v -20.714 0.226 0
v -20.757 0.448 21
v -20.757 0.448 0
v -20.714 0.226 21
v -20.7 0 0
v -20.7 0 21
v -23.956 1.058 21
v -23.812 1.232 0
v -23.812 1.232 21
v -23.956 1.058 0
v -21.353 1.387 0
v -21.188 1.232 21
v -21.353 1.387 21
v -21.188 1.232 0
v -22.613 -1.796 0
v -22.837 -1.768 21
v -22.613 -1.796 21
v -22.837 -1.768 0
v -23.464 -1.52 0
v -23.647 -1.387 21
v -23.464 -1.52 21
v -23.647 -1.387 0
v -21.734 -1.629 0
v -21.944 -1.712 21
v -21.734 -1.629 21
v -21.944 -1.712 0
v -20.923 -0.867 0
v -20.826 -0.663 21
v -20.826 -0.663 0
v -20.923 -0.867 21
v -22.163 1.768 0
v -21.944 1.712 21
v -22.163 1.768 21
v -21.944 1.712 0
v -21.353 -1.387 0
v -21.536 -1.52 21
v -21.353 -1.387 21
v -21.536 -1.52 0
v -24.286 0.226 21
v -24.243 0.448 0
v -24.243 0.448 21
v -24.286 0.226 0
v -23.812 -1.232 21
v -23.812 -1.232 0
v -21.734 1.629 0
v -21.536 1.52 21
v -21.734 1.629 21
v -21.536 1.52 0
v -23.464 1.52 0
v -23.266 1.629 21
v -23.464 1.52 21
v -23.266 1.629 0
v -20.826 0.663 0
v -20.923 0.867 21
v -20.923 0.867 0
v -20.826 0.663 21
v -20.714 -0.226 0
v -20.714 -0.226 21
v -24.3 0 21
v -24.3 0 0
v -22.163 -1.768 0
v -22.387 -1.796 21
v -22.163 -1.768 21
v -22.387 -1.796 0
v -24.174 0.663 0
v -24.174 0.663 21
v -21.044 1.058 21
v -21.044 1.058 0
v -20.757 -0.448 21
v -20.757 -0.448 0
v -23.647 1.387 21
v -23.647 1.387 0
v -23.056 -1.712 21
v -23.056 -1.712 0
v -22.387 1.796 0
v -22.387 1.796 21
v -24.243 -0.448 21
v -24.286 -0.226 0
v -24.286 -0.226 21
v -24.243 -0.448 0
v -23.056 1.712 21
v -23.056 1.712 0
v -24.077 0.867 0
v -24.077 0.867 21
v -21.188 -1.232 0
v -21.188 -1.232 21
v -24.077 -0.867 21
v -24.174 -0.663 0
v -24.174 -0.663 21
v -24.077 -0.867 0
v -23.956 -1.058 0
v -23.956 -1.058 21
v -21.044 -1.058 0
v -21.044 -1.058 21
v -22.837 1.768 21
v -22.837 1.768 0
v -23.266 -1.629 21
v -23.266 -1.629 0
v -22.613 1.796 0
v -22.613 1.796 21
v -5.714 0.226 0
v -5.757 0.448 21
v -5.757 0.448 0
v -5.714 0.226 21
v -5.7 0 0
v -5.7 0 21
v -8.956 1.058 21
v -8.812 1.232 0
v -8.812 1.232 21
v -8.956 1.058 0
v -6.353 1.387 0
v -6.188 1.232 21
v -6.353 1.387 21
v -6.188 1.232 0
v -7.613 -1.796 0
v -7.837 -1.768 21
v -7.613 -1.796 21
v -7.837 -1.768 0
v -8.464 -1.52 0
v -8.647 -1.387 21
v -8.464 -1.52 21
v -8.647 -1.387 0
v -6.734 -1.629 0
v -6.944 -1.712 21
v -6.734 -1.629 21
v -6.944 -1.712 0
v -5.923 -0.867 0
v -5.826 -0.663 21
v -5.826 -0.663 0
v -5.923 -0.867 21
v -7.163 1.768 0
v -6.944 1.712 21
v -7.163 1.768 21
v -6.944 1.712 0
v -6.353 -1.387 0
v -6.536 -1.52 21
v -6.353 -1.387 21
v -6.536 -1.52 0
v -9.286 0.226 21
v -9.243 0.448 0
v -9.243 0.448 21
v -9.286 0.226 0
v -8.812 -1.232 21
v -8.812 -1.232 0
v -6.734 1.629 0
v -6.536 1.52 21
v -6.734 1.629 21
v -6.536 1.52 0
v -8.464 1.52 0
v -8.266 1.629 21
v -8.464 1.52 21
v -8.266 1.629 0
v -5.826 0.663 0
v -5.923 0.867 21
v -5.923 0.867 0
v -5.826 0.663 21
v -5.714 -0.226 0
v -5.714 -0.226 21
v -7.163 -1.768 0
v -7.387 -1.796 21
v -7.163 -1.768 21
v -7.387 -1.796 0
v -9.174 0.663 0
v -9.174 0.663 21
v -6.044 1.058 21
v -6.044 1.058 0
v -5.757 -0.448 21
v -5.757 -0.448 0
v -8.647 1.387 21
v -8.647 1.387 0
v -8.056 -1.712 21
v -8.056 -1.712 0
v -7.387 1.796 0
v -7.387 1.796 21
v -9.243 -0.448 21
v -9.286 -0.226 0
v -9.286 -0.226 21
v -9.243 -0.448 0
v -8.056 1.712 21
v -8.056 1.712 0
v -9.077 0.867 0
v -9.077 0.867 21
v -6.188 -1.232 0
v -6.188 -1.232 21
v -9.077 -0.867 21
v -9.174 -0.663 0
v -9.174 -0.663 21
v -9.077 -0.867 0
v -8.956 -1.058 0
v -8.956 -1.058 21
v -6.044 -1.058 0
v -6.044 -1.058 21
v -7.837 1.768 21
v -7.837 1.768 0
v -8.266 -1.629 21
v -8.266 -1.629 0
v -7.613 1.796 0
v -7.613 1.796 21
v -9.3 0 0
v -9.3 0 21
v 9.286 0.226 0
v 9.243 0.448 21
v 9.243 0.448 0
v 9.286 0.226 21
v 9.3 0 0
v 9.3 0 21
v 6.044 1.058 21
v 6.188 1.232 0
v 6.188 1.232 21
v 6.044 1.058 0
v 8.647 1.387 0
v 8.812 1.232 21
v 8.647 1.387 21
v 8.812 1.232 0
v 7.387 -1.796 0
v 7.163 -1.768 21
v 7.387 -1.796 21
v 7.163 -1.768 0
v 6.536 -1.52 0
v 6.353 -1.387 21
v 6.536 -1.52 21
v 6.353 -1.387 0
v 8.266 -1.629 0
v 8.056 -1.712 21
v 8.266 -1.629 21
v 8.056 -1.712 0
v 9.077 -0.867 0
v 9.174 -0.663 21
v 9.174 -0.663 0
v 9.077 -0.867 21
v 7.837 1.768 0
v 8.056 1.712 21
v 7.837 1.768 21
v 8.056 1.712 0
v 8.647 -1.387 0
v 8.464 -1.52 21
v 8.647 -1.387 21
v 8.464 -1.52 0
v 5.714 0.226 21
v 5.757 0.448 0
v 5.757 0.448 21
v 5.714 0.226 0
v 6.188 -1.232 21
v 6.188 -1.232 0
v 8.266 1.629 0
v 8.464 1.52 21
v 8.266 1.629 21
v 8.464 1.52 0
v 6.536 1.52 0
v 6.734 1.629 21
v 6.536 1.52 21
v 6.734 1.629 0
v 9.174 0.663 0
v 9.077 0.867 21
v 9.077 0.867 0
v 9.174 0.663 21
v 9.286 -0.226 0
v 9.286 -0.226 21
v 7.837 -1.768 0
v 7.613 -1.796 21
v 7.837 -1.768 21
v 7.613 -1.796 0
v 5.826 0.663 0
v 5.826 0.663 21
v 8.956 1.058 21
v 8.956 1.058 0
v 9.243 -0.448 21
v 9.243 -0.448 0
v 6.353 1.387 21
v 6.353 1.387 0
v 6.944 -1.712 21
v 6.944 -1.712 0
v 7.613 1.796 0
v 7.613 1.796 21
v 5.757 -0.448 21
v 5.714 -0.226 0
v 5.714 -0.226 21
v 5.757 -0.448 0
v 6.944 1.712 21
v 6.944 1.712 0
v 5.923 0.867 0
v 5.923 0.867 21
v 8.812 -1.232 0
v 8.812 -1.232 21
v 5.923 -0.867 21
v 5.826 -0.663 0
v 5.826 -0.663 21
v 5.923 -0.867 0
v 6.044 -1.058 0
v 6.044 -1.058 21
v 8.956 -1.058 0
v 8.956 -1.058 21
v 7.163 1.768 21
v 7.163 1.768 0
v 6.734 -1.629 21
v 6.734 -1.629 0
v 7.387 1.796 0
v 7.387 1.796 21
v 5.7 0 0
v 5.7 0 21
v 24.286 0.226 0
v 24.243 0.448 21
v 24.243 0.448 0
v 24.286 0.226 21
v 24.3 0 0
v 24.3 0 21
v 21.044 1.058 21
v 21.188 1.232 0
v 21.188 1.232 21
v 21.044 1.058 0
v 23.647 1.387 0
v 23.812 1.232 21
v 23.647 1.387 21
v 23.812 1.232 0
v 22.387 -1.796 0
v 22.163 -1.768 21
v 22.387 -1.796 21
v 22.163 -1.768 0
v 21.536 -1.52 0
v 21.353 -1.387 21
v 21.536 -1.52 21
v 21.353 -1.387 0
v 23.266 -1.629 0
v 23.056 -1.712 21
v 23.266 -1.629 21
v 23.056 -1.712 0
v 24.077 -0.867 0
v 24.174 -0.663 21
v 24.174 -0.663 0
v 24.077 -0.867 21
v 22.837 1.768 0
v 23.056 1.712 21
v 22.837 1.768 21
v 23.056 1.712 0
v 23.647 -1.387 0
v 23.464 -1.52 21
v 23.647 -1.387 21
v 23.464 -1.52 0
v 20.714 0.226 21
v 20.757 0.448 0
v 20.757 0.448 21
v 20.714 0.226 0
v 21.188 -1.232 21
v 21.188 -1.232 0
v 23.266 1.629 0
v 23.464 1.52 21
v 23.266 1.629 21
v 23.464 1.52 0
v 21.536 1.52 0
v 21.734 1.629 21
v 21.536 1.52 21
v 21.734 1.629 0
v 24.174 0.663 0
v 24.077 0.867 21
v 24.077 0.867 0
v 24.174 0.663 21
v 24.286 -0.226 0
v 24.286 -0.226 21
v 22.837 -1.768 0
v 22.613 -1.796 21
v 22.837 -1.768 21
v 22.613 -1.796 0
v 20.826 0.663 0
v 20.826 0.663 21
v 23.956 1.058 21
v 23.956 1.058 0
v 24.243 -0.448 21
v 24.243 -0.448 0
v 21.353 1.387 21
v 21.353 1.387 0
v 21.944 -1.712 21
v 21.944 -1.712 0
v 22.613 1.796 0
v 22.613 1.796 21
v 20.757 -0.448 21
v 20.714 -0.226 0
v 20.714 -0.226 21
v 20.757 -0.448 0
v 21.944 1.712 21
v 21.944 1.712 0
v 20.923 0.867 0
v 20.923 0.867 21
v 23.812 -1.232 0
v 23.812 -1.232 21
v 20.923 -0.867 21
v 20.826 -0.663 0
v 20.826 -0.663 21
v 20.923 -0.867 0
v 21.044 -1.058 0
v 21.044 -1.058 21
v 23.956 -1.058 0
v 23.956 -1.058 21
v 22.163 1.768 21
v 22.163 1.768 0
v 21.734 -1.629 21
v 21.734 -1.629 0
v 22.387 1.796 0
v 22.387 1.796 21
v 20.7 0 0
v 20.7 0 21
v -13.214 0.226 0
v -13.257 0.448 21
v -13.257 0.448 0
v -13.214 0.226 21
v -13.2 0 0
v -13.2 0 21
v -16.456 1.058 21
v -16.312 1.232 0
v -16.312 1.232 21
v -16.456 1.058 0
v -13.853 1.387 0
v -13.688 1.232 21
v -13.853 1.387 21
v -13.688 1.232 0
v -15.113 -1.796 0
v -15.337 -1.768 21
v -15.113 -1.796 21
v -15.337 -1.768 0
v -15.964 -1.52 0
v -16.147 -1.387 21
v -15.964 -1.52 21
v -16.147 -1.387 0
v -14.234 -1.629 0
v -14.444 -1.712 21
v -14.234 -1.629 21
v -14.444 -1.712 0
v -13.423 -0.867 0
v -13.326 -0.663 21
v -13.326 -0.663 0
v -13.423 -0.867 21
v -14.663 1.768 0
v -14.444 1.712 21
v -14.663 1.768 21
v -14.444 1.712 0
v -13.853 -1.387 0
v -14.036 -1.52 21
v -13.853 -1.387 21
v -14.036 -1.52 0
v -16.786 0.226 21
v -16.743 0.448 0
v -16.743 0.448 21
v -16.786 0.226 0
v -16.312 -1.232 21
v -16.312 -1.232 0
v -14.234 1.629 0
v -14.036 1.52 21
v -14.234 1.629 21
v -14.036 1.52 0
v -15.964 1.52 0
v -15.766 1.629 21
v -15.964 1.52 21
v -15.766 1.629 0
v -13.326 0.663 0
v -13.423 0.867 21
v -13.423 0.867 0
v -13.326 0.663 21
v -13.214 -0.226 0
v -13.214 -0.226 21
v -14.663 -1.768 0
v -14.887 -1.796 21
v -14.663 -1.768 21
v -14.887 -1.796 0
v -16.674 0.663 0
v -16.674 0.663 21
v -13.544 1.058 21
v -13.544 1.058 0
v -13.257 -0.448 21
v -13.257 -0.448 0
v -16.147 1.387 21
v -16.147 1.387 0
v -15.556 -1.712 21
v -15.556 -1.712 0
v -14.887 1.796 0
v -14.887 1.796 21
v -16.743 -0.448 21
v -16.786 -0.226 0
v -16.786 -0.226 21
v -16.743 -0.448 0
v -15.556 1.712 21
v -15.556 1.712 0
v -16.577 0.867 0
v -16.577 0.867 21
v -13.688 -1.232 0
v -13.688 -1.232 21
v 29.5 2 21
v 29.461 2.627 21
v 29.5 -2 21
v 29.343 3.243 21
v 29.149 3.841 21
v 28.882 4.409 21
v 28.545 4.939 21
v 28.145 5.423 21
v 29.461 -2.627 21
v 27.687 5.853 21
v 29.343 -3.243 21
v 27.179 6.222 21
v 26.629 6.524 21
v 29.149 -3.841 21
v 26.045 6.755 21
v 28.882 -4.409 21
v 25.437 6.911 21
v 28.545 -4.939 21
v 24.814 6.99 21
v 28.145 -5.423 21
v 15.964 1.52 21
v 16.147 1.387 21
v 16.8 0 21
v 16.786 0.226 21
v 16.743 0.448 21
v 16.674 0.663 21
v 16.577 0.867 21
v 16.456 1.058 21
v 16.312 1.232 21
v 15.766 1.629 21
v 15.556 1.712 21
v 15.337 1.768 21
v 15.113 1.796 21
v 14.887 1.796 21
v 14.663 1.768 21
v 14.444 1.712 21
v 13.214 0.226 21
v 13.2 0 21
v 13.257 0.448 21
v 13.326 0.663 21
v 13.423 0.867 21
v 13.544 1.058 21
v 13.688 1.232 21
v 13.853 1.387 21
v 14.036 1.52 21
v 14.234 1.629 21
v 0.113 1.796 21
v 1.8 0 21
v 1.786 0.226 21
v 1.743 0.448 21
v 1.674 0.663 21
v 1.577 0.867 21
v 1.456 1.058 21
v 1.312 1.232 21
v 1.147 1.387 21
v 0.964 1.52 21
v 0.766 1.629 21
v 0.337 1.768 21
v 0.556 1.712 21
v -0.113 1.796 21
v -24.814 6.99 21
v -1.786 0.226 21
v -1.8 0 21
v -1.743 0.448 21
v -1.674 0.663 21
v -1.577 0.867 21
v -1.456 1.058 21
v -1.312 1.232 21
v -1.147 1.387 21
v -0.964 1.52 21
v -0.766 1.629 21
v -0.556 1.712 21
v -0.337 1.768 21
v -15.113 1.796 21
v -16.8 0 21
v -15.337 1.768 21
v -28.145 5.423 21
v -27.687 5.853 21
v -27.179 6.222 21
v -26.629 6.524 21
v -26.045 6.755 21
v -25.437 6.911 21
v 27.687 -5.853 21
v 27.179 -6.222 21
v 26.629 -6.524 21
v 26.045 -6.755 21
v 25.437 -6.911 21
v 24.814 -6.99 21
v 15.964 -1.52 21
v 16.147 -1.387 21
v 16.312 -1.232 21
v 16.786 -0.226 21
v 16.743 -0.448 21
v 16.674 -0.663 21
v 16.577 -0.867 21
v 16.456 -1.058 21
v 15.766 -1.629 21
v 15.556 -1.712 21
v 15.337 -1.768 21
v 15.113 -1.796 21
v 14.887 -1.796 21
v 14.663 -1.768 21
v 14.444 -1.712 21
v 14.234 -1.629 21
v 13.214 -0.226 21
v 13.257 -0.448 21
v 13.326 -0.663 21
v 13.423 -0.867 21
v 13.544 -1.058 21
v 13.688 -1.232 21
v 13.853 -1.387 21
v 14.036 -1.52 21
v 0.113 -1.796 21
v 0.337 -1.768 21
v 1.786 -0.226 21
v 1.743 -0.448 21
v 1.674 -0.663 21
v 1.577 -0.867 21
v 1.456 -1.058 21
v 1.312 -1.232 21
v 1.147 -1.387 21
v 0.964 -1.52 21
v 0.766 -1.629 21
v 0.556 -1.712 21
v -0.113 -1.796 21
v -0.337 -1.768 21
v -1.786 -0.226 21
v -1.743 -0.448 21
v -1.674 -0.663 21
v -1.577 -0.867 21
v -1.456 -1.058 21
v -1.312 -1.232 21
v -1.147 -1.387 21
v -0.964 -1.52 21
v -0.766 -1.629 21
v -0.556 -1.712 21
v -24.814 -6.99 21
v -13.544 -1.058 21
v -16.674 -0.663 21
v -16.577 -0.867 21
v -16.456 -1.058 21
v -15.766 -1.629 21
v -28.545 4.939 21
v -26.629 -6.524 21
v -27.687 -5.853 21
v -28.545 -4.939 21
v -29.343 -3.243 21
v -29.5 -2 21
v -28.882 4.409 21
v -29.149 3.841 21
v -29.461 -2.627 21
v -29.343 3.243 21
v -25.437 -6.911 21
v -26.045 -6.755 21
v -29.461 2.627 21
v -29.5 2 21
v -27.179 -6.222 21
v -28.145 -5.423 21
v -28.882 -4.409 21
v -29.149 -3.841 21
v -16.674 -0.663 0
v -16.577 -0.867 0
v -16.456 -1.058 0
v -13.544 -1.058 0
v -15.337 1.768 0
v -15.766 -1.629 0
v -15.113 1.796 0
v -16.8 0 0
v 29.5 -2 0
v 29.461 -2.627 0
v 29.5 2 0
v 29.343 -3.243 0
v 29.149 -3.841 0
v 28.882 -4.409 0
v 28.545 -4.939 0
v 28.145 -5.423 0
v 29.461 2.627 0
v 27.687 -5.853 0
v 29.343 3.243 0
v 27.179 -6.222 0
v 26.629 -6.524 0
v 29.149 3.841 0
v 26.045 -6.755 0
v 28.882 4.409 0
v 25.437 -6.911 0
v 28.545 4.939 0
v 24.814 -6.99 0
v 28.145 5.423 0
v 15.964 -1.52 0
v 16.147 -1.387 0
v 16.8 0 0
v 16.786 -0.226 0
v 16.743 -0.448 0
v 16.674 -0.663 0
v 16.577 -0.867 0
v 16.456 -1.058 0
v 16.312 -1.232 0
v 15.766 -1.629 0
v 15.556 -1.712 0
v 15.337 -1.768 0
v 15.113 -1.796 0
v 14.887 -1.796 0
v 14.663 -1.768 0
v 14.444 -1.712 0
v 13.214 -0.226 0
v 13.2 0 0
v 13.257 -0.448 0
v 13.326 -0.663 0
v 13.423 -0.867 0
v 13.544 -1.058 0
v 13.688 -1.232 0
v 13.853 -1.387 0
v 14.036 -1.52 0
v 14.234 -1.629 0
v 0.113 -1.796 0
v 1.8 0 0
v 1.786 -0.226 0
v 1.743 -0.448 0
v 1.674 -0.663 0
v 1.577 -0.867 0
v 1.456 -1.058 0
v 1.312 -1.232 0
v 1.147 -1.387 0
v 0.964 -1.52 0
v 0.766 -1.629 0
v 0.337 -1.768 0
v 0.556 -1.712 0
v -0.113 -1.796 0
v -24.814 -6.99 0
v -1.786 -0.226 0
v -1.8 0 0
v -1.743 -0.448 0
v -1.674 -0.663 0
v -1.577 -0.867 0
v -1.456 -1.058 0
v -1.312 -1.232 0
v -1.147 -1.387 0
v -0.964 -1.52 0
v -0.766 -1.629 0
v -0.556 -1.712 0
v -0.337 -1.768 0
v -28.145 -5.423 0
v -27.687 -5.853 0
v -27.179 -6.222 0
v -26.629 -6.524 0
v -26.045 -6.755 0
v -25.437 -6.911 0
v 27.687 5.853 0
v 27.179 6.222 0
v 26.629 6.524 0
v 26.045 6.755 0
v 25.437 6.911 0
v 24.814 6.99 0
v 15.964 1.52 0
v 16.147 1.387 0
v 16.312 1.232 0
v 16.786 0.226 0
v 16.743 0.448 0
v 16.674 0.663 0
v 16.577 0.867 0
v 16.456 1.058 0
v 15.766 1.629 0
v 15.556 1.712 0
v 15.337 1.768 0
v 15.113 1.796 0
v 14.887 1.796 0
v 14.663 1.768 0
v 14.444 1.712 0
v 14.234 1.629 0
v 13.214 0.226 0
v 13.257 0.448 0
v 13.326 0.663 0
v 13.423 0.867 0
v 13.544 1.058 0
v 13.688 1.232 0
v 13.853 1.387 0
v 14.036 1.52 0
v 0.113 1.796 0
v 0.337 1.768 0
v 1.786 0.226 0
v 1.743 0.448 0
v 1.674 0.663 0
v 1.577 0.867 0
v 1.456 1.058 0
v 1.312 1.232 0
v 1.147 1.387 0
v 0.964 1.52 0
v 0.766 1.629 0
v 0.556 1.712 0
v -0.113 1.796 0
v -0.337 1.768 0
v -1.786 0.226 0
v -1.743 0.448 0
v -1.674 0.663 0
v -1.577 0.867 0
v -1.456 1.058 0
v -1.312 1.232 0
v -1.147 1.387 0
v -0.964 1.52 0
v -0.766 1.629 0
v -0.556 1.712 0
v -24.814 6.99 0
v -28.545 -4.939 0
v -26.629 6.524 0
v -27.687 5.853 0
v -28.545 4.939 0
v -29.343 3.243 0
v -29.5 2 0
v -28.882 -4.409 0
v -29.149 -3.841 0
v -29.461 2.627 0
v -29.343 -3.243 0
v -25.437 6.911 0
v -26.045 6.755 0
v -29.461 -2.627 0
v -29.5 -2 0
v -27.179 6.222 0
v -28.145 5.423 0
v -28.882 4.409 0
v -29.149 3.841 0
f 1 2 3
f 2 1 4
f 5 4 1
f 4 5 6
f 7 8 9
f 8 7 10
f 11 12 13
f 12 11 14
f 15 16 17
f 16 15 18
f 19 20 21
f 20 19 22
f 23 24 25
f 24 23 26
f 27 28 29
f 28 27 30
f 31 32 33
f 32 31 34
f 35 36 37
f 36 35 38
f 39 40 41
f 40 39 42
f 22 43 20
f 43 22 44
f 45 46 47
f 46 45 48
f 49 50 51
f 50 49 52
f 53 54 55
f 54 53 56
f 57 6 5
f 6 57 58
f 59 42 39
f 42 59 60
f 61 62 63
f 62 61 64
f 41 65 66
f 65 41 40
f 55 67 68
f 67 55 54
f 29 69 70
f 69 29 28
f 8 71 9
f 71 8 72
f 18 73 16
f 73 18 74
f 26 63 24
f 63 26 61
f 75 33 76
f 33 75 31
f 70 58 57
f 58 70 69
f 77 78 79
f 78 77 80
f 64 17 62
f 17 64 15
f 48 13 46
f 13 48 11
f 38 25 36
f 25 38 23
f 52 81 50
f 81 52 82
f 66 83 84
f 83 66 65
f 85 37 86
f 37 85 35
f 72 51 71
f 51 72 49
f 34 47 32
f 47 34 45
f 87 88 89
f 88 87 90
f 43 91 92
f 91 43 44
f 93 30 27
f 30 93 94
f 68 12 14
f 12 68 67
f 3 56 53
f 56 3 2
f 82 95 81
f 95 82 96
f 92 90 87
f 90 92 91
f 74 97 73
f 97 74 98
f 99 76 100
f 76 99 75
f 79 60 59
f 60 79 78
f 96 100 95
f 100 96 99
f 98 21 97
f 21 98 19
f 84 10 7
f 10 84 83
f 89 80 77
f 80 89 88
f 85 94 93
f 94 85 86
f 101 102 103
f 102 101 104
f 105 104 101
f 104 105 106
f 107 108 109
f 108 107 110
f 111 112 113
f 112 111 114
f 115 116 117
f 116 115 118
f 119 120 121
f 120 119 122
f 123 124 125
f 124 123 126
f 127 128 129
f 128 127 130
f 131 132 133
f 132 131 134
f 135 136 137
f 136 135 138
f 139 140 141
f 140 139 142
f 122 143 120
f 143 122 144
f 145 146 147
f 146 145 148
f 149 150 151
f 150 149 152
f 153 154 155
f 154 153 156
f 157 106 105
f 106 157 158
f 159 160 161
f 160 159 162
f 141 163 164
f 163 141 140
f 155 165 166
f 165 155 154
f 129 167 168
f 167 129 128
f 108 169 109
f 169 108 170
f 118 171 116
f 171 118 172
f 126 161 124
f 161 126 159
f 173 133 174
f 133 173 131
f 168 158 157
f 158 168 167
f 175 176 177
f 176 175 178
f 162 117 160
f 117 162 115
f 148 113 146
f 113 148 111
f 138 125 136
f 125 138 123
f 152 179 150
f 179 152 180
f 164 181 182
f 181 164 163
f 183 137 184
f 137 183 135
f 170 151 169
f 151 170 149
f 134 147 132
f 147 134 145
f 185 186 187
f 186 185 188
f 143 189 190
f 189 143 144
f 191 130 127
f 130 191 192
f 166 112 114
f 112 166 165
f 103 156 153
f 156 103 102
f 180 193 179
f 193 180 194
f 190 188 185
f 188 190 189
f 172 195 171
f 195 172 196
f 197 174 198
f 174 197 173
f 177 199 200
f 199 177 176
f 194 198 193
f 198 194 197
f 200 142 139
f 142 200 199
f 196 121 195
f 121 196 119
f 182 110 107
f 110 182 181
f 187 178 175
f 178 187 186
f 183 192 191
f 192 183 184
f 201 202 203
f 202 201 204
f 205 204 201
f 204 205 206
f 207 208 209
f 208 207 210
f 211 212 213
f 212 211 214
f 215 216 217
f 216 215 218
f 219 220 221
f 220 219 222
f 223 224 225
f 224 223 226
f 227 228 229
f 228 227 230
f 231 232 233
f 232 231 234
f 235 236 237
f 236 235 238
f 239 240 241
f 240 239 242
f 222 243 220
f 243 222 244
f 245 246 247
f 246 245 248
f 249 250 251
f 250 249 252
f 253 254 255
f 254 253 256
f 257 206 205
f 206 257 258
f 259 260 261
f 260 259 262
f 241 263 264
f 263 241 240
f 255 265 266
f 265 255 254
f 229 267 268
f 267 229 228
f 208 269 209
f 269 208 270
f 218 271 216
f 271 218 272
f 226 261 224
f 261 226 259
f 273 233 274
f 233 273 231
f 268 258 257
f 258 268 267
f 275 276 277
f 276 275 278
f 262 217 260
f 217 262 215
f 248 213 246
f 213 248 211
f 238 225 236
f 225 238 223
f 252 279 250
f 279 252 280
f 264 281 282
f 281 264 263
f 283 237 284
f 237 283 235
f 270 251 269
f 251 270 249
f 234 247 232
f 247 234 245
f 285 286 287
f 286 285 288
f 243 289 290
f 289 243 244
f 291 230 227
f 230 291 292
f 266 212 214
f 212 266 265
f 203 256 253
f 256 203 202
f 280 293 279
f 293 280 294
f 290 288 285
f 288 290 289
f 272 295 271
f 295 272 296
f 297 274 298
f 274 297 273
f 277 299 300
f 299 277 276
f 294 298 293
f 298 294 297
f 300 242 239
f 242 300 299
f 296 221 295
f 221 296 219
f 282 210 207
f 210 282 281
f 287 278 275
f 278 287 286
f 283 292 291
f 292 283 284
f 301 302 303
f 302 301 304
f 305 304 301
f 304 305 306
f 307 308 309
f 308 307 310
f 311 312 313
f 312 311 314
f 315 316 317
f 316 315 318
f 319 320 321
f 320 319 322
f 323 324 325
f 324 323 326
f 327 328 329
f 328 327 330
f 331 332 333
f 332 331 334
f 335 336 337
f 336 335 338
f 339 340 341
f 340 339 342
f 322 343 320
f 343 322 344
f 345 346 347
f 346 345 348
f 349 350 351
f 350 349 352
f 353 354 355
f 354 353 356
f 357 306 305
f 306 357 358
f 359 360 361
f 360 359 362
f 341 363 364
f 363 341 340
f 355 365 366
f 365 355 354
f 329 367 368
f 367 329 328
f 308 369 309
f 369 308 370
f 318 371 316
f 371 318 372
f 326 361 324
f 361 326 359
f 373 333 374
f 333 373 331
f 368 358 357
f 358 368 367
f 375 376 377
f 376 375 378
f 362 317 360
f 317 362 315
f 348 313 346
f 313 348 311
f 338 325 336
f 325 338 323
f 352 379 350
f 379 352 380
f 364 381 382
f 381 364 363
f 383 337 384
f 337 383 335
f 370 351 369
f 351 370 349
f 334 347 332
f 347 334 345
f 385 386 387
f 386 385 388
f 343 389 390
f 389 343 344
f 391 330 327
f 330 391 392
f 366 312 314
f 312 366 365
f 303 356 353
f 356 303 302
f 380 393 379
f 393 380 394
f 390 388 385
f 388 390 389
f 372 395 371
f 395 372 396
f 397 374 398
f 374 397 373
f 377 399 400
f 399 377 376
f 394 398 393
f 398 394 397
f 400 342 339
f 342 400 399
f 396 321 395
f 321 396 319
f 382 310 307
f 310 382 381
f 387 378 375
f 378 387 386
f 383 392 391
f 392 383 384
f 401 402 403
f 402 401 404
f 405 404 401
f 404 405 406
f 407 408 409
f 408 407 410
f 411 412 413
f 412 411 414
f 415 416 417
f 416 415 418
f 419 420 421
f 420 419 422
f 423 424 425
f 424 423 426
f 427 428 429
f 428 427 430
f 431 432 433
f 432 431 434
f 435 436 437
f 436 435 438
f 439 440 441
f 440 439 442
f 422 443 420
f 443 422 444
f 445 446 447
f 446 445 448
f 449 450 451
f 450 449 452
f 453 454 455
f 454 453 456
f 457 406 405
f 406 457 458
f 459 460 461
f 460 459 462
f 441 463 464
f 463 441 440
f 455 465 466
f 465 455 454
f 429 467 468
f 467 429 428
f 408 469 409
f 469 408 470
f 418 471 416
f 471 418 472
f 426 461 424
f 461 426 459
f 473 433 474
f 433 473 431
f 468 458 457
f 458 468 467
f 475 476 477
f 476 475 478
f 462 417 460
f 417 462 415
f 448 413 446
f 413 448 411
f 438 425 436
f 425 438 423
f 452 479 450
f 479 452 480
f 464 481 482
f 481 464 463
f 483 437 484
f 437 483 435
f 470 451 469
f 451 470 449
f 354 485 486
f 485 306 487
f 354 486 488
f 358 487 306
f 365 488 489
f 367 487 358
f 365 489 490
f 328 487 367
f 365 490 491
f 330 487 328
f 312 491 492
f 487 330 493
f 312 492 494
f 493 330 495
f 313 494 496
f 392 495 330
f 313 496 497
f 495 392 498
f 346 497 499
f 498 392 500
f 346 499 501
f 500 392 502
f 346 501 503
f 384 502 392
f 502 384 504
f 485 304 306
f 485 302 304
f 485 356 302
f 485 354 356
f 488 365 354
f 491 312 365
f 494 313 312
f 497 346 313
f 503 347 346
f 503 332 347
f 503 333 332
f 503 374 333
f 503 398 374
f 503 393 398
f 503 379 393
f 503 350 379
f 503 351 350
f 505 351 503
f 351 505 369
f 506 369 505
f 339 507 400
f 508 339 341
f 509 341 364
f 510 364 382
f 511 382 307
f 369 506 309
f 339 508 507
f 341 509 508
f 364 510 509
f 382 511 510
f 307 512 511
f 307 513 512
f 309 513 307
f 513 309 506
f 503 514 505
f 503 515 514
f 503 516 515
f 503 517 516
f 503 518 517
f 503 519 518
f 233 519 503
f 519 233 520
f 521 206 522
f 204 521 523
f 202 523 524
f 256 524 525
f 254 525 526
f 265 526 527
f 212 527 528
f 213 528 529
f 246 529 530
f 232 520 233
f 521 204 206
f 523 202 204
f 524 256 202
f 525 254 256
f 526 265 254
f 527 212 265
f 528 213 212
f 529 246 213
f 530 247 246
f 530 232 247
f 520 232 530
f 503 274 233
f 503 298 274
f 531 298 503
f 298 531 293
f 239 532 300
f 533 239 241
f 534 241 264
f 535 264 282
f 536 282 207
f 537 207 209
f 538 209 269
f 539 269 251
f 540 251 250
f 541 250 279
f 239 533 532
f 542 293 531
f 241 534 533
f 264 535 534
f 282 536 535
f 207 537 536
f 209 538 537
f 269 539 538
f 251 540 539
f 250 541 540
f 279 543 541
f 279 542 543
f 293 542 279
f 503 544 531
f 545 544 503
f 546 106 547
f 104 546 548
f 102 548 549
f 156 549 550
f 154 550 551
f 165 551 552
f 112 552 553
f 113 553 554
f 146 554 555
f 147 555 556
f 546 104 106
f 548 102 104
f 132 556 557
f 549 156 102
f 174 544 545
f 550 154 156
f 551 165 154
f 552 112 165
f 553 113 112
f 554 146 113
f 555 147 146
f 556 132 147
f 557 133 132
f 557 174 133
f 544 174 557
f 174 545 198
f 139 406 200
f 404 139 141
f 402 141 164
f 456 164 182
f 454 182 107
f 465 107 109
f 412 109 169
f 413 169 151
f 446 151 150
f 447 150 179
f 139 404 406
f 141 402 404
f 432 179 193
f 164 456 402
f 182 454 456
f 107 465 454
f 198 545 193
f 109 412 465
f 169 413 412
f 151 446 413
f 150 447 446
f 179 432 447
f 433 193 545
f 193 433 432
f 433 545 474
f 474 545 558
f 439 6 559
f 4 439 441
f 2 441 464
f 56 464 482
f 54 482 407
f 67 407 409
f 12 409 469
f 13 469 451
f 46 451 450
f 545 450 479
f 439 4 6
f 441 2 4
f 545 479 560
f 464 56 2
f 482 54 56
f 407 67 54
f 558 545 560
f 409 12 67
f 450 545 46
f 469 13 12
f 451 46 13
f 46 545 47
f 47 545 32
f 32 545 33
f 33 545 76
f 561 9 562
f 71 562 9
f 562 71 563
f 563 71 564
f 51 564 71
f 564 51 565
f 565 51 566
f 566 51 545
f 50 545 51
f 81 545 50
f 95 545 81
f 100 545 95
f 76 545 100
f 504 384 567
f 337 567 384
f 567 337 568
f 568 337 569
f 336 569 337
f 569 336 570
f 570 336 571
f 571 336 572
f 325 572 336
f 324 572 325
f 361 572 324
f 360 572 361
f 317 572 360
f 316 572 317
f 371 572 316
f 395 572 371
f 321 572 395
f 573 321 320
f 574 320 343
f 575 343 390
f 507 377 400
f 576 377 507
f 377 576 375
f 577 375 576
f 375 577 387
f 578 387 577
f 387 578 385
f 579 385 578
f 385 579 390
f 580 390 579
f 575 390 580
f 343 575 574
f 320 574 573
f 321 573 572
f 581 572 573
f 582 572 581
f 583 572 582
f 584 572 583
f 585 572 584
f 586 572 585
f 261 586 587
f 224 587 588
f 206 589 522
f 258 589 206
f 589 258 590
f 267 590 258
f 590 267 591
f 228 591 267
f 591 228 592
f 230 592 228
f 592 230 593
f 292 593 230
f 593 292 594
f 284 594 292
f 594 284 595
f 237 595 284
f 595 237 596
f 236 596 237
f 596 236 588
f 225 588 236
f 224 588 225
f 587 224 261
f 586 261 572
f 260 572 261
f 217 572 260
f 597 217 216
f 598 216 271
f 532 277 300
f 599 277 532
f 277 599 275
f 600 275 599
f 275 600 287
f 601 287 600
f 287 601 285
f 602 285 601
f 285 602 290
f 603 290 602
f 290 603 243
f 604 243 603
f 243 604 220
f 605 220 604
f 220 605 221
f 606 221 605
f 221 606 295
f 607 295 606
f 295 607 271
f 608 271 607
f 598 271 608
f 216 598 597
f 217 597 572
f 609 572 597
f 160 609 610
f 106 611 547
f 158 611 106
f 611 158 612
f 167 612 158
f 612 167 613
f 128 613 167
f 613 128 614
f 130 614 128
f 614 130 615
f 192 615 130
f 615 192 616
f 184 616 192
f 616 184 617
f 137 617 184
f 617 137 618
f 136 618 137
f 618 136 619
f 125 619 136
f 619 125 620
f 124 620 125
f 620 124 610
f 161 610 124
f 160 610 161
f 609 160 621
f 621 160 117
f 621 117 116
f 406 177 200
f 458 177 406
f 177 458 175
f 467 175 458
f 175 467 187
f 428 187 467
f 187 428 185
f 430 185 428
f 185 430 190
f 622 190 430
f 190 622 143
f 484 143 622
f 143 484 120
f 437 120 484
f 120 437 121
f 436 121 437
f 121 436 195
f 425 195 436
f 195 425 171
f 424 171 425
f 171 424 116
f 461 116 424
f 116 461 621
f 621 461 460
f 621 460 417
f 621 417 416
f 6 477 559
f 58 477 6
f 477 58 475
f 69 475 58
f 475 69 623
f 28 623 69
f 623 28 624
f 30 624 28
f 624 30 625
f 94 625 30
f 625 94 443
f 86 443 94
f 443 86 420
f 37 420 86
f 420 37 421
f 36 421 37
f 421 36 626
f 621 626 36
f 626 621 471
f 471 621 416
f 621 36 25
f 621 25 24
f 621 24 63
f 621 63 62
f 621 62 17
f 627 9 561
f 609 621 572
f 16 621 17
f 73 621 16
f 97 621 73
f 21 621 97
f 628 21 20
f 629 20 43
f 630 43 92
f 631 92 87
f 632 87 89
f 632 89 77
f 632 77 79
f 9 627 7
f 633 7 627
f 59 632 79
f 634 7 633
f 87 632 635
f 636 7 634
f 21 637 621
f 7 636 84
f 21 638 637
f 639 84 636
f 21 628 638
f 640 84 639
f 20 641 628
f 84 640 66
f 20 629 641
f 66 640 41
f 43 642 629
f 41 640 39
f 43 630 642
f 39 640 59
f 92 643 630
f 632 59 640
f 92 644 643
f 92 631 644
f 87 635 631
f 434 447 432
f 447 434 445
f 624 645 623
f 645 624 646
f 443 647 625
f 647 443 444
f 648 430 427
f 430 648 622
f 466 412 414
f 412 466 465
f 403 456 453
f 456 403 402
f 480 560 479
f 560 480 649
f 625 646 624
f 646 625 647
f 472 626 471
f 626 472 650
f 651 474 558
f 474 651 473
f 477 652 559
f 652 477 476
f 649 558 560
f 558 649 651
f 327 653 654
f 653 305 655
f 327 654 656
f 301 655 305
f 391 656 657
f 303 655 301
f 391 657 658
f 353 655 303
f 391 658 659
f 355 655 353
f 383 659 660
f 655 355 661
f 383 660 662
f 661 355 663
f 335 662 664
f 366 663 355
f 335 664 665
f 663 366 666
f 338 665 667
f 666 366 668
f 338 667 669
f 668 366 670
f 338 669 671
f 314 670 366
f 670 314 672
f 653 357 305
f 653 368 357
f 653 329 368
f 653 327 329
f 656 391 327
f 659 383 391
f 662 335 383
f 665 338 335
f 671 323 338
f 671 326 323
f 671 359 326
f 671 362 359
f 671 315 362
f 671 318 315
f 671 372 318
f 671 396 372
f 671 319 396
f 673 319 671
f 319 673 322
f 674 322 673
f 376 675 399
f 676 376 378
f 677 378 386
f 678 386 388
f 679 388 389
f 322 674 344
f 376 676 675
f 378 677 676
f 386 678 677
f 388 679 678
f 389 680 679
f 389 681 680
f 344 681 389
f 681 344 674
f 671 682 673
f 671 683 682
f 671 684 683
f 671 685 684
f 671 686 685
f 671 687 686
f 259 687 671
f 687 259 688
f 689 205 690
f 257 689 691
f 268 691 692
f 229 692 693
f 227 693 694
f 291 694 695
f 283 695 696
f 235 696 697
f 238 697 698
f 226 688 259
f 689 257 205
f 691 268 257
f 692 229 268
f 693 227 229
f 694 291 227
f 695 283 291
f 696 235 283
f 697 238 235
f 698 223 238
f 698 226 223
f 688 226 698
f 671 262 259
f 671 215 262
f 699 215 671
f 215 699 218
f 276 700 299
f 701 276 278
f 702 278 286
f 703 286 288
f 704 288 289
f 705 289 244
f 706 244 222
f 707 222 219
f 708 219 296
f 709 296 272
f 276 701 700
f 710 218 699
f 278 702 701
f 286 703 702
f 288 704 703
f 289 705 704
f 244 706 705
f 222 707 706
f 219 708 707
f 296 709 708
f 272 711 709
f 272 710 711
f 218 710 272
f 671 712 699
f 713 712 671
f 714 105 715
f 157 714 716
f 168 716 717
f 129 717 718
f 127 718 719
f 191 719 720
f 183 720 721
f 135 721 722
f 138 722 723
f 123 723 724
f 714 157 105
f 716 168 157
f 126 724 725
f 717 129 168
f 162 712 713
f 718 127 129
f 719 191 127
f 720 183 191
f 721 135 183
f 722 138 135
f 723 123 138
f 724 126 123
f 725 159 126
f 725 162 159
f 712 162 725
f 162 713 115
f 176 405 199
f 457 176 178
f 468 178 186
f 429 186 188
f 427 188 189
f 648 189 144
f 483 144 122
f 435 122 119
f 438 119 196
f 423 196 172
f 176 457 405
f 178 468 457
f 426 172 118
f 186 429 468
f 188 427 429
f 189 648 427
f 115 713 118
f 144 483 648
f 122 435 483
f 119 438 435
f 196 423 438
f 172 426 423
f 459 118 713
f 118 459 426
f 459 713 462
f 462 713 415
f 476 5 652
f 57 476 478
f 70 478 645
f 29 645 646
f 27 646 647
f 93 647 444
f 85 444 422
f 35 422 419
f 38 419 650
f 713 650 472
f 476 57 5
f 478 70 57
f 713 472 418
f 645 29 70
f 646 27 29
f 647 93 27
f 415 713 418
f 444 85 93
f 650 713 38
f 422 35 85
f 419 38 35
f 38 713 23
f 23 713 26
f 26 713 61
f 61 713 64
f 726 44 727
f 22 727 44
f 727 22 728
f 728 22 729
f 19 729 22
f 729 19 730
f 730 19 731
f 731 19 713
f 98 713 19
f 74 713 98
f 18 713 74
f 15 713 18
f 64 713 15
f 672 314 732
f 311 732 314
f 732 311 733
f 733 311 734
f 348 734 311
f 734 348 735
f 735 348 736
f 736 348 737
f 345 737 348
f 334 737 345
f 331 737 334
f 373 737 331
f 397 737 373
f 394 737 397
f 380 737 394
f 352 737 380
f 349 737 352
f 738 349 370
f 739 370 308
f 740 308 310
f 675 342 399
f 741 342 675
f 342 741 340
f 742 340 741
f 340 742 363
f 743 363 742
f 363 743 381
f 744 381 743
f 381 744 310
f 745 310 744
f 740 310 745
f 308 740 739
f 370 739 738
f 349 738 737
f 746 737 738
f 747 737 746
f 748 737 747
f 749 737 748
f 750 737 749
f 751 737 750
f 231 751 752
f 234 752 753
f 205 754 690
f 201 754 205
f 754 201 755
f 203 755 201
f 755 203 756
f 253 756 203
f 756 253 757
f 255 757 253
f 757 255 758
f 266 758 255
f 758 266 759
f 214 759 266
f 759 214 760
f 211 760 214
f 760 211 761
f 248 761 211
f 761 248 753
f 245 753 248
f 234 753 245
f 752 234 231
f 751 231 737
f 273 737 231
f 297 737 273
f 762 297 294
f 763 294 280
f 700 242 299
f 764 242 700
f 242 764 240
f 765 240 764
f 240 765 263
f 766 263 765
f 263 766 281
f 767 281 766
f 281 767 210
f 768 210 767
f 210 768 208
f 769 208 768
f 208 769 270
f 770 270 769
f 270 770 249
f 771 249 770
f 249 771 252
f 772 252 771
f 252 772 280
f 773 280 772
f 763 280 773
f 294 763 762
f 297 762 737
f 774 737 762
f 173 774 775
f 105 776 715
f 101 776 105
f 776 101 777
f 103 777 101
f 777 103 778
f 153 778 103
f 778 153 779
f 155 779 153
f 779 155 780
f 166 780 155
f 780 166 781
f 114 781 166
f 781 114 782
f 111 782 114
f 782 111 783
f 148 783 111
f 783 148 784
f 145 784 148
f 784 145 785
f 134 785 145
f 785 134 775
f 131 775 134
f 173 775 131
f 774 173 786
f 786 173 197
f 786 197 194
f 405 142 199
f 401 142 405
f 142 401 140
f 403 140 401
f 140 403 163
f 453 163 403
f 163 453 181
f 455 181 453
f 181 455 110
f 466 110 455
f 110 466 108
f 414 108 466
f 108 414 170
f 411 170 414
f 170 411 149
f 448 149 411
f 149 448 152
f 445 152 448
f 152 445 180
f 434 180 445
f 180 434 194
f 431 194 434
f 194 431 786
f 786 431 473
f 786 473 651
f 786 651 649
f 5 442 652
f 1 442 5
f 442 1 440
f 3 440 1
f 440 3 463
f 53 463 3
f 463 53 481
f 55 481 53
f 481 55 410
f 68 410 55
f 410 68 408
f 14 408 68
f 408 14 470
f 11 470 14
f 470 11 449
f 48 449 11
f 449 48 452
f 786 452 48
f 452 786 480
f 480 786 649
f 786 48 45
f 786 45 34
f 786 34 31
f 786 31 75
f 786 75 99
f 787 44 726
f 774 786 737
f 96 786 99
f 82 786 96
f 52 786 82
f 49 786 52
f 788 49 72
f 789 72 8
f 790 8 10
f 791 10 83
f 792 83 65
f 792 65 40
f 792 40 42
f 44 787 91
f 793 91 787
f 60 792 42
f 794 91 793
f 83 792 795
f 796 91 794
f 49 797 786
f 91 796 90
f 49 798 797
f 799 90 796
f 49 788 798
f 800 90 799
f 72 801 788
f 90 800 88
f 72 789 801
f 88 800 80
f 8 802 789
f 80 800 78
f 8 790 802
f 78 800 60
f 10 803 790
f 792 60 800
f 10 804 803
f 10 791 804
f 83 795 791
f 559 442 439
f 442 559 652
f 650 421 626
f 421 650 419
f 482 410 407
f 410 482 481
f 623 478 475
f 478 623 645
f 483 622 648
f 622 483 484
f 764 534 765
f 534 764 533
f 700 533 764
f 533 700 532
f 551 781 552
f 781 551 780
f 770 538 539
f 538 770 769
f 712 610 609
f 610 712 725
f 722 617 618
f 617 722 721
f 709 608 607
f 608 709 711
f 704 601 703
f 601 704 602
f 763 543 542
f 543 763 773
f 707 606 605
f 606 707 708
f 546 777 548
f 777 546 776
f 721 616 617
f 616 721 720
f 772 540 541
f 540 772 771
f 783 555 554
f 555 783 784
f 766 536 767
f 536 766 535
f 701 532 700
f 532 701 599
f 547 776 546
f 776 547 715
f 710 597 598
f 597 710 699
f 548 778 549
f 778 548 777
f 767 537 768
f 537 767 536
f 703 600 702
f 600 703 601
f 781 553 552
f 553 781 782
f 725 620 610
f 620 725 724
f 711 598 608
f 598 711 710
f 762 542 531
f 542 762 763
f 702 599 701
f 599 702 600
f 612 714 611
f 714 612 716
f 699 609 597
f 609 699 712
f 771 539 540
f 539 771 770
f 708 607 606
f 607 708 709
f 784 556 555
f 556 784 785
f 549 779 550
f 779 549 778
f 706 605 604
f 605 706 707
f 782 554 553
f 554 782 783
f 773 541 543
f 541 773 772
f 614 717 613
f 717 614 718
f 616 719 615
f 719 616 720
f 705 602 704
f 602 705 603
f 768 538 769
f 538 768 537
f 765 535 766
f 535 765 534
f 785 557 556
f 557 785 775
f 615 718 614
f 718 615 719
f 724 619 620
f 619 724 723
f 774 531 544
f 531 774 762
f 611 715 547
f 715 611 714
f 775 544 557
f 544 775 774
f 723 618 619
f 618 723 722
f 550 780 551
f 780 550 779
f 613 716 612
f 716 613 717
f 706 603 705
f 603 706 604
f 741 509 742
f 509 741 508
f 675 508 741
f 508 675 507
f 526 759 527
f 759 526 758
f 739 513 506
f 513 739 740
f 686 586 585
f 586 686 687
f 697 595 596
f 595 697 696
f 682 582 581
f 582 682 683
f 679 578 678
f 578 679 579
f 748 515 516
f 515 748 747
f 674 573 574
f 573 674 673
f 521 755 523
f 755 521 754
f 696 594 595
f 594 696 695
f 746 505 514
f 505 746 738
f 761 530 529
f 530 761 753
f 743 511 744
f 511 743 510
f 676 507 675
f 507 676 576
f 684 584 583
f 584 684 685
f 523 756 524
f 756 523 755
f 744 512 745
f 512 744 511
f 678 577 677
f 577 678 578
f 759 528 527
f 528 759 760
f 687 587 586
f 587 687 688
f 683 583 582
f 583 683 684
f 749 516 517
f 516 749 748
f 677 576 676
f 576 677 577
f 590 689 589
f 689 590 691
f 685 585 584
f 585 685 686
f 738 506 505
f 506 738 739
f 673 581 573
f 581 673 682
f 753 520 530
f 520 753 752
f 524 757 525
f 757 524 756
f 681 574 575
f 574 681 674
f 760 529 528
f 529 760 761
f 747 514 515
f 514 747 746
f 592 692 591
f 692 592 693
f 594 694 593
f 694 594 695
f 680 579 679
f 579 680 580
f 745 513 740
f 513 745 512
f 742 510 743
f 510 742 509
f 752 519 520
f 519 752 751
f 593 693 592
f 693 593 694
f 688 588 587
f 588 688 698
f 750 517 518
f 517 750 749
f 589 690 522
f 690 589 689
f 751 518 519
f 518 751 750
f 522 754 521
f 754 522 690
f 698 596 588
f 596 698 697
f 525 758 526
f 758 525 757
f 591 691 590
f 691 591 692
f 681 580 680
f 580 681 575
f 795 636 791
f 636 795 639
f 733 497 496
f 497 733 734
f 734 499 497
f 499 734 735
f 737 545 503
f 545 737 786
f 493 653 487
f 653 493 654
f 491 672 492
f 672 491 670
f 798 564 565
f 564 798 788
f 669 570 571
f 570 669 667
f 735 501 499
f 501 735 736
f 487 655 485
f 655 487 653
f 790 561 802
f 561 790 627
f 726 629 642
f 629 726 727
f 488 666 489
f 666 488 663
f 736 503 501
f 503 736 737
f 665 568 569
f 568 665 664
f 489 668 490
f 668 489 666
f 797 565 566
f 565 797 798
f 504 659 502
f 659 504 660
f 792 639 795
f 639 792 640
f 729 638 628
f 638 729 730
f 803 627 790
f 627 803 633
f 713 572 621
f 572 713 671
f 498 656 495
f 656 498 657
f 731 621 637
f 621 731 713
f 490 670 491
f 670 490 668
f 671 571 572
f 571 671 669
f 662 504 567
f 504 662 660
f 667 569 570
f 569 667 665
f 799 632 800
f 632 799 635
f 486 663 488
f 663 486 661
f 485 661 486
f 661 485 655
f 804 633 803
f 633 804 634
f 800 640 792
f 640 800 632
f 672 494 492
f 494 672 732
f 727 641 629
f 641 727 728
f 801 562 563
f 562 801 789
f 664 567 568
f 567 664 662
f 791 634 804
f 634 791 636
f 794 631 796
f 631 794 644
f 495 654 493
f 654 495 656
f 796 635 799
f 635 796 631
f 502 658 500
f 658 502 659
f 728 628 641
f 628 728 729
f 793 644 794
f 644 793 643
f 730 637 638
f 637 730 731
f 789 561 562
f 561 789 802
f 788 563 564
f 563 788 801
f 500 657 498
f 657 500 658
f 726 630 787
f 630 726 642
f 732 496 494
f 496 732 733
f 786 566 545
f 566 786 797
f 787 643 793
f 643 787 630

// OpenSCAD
$fn = 50;


difference() {
	union() {
		hull() {
			translate(v = [-24.5000000000, 2.0000000000, 0]) {
				cylinder(h = 21, r = 5);
			}
			translate(v = [24.5000000000, 2.0000000000, 0]) {
				cylinder(h = 21, r = 5);
			}
			translate(v = [-24.5000000000, -2.0000000000, 0]) {
				cylinder(h = 21, r = 5);
			}
			translate(v = [24.5000000000, -2.0000000000, 0]) {
				cylinder(h = 21, r = 5);
			}
		}
	}
	union() {
		translate(v = [-22.5000000000, 0.0000000000, -100.0000000000]) {
			cylinder(h = 200, r = 1.8000000000);
		}
		translate(v = [-7.5000000000, 0.0000000000, -100.0000000000]) {
			cylinder(h = 200, r = 1.8000000000);
		}
		translate(v = [7.5000000000, 0.0000000000, -100.0000000000]) {
			cylinder(h = 200, r = 1.8000000000);
		}
		translate(v = [22.5000000000, 0.0000000000, -100.0000000000]) {
			cylinder(h = 200, r = 1.8000000000);
		}
		translate(v = [-22.5000000000, 0.0000000000, 0]) {
			cylinder(h = 21, r = 1.8000000000);
		}
		translate(v = [-15.0000000000, 0.0000000000, 0]) {
			cylinder(h = 21, r = 1.8000000000);
		}
		translate(v = [-7.5000000000, 0.0000000000, 0]) {
			cylinder(h = 21, r = 1.8000000000);
		}
		cylinder(h = 21, r = 1.8000000000);
		translate(v = [7.5000000000, 0.0000000000, 0]) {
			cylinder(h = 21, r = 1.8000000000);
		}
		translate(v = [15.0000000000, 0.0000000000, 0]) {
			cylinder(h = 21, r = 1.8000000000);
		}
		translate(v = [22.5000000000, 0.0000000000, 0]) {
			cylinder(h = 21, r = 1.8000000000);
		}
		translate(v = [-22.5000000000, 0.0000000000, 0]) {
			cylinder(h = 21, r = 1.8000000000);
		}
		translate(v = [-15.0000000000, 0.0000000000, 0]) {
			cylinder(h = 21, r = 1.8000000000);
		}
		translate(v = [-7.5000000000, 0.0000000000, 0]) {
			cylinder(h = 21, r = 1.8000000000);
		}
		cylinder(h = 21, r = 1.8000000000);
		translate(v = [7.5000000000, 0.0000000000, 0]) {
			cylinder(h = 21, r = 1.8000000000);
		}
		translate(v = [15.0000000000, 0.0000000000, 0]) {
			cylinder(h = 21, r = 1.8000000000);
		}
		translate(v = [22.5000000000, 0.0000000000, 0]) {
			cylinder(h = 21, r = 1.8000000000);
		}
		translate(v = [-22.5000000000, 0.0000000000, 0]) {
			cylinder(h = 21, r = 1.8000000000);
		}
		translate(v = [-15.0000000000, 0.0000000000, 0]) {
			cylinder(h = 21, r = 1.8000000000);
		}
		translate(v = [-7.5000000000, 0.0000000000, 0]) {
			cylinder(h = 21, r = 1.8000000000);
		}
		cylinder(h = 21, r = 1.8000000000);
		translate(v = [7.5000000000, 0.0000000000, 0]) {
			cylinder(h = 21, r = 1.8000000000);
		}
		translate(v = [15.0000000000, 0.0000000000, 0]) {
			cylinder(h = 21, r = 1.8000000000);
		}
		translate(v = [22.5000000000, 0.0000000000, 0]) {
			cylinder(h = 21, r = 1.8000000000);
		}
	}
}
